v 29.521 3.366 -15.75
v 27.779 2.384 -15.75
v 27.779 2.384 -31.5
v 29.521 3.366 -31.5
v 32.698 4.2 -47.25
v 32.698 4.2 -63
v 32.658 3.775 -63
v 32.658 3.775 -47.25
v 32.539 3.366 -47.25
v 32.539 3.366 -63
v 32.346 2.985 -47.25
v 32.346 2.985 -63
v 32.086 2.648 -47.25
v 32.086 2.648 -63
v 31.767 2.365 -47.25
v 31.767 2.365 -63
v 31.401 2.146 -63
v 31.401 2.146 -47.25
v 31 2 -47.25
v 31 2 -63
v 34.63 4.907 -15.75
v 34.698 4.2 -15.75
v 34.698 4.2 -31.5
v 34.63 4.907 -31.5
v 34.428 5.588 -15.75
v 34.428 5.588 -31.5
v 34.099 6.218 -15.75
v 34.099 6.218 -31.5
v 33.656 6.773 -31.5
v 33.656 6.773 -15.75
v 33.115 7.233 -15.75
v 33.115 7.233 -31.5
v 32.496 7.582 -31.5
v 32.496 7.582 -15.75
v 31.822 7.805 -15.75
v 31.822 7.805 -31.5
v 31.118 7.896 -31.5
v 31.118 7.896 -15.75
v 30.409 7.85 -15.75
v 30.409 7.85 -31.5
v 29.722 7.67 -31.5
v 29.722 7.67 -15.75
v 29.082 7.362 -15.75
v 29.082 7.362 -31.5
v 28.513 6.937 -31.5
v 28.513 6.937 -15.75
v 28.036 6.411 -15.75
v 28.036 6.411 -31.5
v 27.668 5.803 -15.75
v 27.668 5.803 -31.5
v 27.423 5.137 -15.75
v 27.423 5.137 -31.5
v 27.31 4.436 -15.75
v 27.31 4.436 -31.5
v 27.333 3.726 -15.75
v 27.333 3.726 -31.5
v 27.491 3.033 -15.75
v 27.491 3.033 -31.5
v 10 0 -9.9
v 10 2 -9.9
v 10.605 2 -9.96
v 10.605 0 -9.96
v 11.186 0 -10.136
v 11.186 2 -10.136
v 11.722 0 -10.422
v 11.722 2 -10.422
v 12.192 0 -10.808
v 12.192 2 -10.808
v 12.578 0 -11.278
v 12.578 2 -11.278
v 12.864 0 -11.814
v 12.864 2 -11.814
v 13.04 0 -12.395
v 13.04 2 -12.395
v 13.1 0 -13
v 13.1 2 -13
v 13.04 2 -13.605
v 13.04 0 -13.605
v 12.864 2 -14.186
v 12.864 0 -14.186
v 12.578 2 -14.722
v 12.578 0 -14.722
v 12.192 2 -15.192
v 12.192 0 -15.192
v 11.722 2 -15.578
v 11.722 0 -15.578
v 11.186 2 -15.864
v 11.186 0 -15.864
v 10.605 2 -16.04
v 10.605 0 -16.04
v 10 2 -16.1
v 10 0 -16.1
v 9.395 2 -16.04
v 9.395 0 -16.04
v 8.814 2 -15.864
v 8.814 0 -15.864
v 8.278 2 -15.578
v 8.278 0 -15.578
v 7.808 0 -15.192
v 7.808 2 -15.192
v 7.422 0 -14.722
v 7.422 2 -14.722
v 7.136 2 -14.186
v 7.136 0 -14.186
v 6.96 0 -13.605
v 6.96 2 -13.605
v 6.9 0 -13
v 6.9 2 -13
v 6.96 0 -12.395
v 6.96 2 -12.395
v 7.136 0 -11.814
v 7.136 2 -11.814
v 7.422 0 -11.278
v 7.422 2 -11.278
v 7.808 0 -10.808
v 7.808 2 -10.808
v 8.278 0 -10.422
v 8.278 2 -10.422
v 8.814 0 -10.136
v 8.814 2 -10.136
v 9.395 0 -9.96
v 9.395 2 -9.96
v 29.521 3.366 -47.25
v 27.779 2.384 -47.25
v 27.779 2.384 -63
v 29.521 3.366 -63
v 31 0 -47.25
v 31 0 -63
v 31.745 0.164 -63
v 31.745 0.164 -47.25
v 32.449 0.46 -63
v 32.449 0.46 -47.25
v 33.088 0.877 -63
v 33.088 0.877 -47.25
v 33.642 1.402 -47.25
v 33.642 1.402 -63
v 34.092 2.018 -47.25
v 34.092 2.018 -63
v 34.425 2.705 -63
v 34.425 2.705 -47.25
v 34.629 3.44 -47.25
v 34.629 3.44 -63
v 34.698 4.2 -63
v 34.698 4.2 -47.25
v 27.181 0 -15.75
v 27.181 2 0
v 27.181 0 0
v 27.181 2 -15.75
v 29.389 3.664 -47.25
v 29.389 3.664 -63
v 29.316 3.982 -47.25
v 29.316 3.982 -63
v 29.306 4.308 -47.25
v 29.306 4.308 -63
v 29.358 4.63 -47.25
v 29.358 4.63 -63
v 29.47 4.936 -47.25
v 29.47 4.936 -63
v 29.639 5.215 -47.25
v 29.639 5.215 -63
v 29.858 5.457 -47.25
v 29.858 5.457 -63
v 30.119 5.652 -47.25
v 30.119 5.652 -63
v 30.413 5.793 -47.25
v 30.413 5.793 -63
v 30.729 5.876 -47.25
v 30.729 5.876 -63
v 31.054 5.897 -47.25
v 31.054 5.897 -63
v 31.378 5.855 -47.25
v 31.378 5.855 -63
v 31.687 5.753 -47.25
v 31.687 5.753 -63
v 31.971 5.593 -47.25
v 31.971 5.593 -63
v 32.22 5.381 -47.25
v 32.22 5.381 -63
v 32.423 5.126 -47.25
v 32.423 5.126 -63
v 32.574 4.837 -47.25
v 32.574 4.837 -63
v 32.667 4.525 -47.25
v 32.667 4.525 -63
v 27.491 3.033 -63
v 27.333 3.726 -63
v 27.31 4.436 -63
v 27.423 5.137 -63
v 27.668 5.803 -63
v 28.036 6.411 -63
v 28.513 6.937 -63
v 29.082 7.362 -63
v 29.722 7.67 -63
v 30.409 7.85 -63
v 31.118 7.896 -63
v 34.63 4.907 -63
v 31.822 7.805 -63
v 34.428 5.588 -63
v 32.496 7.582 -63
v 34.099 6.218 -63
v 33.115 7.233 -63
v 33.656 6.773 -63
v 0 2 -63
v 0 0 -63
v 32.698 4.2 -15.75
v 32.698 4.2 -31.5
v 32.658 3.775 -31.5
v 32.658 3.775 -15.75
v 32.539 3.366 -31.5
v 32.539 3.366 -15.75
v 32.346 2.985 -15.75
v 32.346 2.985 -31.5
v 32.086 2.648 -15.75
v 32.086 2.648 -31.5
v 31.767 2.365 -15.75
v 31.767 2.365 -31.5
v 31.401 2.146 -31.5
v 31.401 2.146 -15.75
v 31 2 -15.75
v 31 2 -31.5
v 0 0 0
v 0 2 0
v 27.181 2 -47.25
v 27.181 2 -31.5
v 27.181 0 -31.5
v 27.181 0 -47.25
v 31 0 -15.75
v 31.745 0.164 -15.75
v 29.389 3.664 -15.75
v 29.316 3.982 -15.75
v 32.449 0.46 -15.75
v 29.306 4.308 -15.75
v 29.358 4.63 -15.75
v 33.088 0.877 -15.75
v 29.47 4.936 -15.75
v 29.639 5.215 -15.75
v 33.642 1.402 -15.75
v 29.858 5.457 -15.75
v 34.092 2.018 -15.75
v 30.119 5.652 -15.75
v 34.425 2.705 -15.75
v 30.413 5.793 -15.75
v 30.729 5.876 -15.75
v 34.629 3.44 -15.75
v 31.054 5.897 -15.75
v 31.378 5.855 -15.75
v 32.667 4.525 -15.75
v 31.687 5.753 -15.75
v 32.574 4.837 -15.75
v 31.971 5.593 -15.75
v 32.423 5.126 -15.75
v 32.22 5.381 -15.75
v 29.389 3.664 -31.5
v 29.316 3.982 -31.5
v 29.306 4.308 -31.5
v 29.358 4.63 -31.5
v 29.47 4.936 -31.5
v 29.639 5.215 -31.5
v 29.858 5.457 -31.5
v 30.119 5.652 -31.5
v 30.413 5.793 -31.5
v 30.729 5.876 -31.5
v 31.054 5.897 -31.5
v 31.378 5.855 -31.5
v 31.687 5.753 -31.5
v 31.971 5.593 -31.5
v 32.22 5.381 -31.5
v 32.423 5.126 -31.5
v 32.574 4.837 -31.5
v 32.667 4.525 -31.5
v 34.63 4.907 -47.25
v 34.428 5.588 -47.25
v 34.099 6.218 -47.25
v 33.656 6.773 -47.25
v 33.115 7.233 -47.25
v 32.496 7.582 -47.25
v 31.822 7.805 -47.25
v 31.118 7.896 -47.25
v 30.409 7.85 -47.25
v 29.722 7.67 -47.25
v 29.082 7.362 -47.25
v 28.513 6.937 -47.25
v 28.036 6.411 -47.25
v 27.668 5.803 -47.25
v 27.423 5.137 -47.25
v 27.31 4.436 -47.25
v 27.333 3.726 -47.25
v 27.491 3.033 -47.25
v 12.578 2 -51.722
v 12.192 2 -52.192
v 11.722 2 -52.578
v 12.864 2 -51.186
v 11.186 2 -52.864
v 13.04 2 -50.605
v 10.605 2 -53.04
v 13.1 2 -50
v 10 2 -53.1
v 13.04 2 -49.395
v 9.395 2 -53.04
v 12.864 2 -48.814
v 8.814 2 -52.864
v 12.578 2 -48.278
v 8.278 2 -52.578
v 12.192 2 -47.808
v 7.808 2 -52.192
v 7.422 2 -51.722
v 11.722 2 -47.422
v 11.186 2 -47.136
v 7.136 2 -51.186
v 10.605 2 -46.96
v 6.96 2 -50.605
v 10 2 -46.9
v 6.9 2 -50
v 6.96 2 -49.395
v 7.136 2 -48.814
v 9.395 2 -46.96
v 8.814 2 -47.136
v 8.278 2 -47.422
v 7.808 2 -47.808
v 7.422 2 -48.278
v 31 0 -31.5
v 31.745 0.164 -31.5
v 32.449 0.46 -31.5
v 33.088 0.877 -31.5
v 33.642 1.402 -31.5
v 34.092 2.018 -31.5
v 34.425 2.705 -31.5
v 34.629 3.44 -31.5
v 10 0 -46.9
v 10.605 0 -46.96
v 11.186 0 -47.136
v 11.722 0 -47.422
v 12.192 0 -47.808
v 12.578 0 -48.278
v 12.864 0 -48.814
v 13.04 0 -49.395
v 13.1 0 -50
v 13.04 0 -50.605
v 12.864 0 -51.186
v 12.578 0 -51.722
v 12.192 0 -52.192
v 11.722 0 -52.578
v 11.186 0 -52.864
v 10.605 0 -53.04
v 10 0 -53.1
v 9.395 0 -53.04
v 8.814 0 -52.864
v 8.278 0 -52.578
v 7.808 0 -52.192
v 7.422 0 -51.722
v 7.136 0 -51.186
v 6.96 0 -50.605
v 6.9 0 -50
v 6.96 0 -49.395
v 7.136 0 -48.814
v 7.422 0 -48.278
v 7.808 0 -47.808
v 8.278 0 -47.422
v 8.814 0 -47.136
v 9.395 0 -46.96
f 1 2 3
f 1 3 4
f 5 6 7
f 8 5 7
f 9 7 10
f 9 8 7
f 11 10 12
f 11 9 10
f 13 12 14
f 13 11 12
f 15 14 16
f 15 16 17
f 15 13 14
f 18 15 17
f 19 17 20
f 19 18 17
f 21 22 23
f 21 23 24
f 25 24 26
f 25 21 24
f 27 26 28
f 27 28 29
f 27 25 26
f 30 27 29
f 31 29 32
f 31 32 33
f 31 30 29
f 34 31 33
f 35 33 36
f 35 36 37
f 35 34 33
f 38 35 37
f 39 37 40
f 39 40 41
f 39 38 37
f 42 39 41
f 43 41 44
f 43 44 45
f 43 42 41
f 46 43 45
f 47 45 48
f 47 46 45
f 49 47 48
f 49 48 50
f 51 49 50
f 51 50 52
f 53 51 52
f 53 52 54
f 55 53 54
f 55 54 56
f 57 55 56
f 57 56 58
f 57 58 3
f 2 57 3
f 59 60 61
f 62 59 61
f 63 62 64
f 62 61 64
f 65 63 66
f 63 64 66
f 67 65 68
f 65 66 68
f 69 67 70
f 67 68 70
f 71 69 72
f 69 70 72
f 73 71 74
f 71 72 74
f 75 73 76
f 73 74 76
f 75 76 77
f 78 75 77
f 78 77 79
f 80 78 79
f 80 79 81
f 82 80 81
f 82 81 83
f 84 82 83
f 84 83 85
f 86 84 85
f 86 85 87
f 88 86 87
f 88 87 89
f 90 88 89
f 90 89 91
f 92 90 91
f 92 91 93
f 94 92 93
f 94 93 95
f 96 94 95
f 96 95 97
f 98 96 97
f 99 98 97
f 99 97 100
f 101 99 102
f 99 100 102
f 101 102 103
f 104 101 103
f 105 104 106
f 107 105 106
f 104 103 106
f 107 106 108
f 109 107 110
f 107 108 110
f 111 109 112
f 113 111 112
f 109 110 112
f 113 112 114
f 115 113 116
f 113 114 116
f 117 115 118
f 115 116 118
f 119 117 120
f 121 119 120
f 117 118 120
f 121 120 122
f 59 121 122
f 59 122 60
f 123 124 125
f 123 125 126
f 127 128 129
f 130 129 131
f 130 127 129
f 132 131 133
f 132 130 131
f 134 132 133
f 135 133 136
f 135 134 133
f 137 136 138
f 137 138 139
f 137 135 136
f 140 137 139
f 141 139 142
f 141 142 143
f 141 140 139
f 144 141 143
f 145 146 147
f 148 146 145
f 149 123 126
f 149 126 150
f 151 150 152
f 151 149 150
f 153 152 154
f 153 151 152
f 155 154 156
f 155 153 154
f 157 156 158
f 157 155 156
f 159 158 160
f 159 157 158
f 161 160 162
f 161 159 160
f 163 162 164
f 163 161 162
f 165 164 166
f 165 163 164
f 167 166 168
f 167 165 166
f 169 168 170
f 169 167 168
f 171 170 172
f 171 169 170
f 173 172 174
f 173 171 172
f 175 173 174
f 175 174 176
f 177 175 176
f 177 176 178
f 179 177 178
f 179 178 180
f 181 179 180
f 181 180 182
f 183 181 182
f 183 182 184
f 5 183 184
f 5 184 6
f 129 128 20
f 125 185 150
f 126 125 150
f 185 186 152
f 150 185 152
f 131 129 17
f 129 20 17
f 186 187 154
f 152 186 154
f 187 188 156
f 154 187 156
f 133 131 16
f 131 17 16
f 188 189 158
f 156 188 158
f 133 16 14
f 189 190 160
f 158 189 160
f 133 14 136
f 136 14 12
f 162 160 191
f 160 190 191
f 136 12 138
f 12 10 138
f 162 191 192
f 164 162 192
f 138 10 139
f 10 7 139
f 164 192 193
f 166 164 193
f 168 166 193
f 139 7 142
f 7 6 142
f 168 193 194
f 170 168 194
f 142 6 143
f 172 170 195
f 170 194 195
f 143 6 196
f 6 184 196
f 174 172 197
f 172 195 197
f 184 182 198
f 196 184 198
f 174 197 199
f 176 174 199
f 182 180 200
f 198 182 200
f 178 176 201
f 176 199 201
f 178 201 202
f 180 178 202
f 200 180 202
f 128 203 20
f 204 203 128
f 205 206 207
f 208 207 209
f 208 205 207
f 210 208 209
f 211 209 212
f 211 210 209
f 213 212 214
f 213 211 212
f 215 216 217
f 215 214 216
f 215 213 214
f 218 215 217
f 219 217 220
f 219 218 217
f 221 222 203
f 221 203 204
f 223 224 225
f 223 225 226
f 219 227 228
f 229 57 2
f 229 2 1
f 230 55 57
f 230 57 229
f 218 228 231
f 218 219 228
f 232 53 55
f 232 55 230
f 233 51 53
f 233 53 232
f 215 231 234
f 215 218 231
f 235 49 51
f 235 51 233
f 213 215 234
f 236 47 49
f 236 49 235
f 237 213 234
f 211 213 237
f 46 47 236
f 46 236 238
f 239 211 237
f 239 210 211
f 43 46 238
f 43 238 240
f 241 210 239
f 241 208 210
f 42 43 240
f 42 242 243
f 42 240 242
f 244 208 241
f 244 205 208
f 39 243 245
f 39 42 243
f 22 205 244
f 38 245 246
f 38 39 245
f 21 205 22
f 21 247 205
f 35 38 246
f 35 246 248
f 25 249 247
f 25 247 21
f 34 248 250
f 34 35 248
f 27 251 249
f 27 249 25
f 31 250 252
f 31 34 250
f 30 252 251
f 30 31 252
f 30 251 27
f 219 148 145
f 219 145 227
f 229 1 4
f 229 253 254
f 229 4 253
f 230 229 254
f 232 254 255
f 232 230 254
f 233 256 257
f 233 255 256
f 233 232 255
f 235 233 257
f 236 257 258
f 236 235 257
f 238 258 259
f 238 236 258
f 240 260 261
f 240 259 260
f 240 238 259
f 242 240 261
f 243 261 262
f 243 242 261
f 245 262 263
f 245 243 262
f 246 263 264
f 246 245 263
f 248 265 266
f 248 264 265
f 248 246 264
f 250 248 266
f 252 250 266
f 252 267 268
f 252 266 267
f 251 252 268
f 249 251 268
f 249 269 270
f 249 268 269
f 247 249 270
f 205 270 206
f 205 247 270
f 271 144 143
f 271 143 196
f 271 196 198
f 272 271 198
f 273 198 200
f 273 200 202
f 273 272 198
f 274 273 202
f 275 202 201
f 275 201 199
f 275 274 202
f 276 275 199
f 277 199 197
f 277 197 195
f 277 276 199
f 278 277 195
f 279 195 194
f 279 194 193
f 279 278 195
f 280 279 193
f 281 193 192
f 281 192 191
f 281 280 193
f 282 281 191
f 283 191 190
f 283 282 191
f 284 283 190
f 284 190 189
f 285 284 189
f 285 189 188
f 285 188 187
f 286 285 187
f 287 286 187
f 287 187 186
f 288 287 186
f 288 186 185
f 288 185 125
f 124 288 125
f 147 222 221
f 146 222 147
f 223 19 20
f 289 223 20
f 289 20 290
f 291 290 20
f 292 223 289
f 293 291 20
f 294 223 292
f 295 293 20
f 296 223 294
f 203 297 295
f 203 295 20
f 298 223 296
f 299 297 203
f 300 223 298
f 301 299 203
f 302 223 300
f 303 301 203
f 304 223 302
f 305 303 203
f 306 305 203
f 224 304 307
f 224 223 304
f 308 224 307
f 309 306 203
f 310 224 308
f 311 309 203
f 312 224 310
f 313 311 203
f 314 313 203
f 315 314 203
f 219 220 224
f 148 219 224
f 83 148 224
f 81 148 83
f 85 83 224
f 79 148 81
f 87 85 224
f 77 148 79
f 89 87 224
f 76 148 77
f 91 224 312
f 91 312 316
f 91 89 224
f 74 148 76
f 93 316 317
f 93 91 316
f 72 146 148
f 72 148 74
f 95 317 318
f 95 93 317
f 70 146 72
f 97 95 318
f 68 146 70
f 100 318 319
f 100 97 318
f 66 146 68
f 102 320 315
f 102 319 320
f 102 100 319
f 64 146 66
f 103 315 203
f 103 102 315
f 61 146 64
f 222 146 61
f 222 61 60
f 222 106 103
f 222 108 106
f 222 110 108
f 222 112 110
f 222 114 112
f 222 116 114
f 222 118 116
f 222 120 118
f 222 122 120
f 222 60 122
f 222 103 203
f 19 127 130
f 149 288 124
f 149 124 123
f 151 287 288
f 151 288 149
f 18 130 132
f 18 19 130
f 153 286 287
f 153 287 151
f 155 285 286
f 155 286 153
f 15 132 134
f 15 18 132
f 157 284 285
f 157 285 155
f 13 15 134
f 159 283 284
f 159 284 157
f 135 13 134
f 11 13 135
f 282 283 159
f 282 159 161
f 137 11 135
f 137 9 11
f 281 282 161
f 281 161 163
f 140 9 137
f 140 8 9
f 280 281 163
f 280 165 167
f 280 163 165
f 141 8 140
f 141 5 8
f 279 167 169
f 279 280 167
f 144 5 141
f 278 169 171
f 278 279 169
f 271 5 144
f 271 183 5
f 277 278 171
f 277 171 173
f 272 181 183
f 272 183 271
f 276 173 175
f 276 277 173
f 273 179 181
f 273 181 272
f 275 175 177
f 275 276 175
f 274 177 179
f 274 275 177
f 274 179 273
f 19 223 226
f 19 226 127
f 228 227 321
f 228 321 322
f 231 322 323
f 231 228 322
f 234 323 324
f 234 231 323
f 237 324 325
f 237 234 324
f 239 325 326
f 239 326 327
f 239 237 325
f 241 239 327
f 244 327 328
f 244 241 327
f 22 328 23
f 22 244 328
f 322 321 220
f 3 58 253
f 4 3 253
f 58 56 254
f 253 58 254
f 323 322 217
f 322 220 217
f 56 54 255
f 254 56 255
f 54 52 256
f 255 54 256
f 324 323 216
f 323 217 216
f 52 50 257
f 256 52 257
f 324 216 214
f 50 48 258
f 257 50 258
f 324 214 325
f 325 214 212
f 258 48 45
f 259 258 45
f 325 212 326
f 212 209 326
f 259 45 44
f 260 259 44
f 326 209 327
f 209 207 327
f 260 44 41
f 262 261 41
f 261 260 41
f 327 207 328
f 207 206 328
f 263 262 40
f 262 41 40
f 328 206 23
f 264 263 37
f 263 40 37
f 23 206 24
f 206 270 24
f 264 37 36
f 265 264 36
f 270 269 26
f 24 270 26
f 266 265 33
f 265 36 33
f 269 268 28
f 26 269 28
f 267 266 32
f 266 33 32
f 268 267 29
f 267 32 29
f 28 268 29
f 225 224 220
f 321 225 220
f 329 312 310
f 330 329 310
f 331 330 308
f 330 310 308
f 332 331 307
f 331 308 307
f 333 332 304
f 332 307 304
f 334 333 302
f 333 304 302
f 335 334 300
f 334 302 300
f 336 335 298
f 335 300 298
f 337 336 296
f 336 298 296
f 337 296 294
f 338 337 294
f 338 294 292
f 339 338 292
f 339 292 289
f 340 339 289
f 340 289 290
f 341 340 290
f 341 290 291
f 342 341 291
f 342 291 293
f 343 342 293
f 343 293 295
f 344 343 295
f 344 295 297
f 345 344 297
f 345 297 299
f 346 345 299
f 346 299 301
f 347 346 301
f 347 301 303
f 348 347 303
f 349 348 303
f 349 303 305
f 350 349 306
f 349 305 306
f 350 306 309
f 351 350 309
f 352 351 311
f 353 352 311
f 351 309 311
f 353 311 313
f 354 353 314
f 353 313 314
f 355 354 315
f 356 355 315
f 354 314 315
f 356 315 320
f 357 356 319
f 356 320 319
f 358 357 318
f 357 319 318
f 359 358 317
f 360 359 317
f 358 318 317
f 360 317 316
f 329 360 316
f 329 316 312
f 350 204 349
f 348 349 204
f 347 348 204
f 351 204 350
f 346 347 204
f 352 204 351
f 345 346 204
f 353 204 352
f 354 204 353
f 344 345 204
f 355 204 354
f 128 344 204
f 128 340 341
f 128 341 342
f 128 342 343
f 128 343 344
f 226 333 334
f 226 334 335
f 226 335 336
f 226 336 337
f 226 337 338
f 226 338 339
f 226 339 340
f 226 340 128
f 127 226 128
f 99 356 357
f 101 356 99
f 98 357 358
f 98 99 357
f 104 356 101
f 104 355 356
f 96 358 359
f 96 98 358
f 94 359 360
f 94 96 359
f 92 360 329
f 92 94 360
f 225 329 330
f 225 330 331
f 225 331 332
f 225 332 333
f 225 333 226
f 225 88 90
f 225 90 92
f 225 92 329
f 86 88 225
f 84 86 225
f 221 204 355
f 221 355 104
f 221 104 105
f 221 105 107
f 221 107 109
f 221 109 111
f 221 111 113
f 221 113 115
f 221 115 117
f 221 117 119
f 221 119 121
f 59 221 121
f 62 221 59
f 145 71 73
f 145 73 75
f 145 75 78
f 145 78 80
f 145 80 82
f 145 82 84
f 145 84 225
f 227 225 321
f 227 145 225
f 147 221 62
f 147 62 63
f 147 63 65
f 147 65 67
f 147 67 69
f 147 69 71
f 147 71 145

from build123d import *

# Parameters (mm, degrees)
BOSS_EXTRUDE1_DEPTH = 63
SKETCH4_W           = 10.621571424
SKETCH4_H           = 15.75
SKETCH4_R           = 3.1
CUT_EXTRUDE5_DEPTH  = 63


with BuildPart() as part:
    # Sketch3 → Boss-Extrude1 (new body)
    with BuildSketch(Plane.XY):
        with BuildLine():
            Line((0, 0), (31, 0))
            ThreePointArc((31, 0), (33.641651825, 1.402050733), (34.697848077, 4.2))
            ThreePointArc((34.697848077, 4.2), (30.061245163, 7.776705153), (27.778786239, 2.383998263))
            Line((27.778786239, 2.383998263), (29.520996138, 3.366192068))
            ThreePointArc((29.520996138, 3.366192068), (30.568975506, 5.842225922), (32.697848077, 4.2))
            ThreePointArc((32.697848077, 4.2), (32.224028116, 2.810513756), (31, 2))
            Line((31, 2), (28.027781906, 2))
            Line((28.027781906, 2), (0, 2))
            Line((0, 2), (0, 0))
        make_face()
    extrude(amount=-BOSS_EXTRUDE1_DEPTH)

    # Sketch4 → Cut-Extrude5 (cut)
    with BuildSketch(Plane(origin=(0, 12, 0), x_dir=(1, 0, 0), z_dir=(0, 1, 0))):
        with Locations((32.491992857, 39.375)):
            Rectangle(SKETCH4_W, SKETCH4_H)
        with Locations((32.491992857, 7.875)):
            Rectangle(SKETCH4_W, SKETCH4_H)
        with Locations(Location((10, 13, 0), (0, 0, 270))):
            Circle(SKETCH4_R)
        with Locations(Location((10, 50, 0), (0, 0, 270))):
            Circle(SKETCH4_R)
    extrude(amount=-CUT_EXTRUDE5_DEPTH, mode=Mode.SUBTRACT)


solid = part.part
